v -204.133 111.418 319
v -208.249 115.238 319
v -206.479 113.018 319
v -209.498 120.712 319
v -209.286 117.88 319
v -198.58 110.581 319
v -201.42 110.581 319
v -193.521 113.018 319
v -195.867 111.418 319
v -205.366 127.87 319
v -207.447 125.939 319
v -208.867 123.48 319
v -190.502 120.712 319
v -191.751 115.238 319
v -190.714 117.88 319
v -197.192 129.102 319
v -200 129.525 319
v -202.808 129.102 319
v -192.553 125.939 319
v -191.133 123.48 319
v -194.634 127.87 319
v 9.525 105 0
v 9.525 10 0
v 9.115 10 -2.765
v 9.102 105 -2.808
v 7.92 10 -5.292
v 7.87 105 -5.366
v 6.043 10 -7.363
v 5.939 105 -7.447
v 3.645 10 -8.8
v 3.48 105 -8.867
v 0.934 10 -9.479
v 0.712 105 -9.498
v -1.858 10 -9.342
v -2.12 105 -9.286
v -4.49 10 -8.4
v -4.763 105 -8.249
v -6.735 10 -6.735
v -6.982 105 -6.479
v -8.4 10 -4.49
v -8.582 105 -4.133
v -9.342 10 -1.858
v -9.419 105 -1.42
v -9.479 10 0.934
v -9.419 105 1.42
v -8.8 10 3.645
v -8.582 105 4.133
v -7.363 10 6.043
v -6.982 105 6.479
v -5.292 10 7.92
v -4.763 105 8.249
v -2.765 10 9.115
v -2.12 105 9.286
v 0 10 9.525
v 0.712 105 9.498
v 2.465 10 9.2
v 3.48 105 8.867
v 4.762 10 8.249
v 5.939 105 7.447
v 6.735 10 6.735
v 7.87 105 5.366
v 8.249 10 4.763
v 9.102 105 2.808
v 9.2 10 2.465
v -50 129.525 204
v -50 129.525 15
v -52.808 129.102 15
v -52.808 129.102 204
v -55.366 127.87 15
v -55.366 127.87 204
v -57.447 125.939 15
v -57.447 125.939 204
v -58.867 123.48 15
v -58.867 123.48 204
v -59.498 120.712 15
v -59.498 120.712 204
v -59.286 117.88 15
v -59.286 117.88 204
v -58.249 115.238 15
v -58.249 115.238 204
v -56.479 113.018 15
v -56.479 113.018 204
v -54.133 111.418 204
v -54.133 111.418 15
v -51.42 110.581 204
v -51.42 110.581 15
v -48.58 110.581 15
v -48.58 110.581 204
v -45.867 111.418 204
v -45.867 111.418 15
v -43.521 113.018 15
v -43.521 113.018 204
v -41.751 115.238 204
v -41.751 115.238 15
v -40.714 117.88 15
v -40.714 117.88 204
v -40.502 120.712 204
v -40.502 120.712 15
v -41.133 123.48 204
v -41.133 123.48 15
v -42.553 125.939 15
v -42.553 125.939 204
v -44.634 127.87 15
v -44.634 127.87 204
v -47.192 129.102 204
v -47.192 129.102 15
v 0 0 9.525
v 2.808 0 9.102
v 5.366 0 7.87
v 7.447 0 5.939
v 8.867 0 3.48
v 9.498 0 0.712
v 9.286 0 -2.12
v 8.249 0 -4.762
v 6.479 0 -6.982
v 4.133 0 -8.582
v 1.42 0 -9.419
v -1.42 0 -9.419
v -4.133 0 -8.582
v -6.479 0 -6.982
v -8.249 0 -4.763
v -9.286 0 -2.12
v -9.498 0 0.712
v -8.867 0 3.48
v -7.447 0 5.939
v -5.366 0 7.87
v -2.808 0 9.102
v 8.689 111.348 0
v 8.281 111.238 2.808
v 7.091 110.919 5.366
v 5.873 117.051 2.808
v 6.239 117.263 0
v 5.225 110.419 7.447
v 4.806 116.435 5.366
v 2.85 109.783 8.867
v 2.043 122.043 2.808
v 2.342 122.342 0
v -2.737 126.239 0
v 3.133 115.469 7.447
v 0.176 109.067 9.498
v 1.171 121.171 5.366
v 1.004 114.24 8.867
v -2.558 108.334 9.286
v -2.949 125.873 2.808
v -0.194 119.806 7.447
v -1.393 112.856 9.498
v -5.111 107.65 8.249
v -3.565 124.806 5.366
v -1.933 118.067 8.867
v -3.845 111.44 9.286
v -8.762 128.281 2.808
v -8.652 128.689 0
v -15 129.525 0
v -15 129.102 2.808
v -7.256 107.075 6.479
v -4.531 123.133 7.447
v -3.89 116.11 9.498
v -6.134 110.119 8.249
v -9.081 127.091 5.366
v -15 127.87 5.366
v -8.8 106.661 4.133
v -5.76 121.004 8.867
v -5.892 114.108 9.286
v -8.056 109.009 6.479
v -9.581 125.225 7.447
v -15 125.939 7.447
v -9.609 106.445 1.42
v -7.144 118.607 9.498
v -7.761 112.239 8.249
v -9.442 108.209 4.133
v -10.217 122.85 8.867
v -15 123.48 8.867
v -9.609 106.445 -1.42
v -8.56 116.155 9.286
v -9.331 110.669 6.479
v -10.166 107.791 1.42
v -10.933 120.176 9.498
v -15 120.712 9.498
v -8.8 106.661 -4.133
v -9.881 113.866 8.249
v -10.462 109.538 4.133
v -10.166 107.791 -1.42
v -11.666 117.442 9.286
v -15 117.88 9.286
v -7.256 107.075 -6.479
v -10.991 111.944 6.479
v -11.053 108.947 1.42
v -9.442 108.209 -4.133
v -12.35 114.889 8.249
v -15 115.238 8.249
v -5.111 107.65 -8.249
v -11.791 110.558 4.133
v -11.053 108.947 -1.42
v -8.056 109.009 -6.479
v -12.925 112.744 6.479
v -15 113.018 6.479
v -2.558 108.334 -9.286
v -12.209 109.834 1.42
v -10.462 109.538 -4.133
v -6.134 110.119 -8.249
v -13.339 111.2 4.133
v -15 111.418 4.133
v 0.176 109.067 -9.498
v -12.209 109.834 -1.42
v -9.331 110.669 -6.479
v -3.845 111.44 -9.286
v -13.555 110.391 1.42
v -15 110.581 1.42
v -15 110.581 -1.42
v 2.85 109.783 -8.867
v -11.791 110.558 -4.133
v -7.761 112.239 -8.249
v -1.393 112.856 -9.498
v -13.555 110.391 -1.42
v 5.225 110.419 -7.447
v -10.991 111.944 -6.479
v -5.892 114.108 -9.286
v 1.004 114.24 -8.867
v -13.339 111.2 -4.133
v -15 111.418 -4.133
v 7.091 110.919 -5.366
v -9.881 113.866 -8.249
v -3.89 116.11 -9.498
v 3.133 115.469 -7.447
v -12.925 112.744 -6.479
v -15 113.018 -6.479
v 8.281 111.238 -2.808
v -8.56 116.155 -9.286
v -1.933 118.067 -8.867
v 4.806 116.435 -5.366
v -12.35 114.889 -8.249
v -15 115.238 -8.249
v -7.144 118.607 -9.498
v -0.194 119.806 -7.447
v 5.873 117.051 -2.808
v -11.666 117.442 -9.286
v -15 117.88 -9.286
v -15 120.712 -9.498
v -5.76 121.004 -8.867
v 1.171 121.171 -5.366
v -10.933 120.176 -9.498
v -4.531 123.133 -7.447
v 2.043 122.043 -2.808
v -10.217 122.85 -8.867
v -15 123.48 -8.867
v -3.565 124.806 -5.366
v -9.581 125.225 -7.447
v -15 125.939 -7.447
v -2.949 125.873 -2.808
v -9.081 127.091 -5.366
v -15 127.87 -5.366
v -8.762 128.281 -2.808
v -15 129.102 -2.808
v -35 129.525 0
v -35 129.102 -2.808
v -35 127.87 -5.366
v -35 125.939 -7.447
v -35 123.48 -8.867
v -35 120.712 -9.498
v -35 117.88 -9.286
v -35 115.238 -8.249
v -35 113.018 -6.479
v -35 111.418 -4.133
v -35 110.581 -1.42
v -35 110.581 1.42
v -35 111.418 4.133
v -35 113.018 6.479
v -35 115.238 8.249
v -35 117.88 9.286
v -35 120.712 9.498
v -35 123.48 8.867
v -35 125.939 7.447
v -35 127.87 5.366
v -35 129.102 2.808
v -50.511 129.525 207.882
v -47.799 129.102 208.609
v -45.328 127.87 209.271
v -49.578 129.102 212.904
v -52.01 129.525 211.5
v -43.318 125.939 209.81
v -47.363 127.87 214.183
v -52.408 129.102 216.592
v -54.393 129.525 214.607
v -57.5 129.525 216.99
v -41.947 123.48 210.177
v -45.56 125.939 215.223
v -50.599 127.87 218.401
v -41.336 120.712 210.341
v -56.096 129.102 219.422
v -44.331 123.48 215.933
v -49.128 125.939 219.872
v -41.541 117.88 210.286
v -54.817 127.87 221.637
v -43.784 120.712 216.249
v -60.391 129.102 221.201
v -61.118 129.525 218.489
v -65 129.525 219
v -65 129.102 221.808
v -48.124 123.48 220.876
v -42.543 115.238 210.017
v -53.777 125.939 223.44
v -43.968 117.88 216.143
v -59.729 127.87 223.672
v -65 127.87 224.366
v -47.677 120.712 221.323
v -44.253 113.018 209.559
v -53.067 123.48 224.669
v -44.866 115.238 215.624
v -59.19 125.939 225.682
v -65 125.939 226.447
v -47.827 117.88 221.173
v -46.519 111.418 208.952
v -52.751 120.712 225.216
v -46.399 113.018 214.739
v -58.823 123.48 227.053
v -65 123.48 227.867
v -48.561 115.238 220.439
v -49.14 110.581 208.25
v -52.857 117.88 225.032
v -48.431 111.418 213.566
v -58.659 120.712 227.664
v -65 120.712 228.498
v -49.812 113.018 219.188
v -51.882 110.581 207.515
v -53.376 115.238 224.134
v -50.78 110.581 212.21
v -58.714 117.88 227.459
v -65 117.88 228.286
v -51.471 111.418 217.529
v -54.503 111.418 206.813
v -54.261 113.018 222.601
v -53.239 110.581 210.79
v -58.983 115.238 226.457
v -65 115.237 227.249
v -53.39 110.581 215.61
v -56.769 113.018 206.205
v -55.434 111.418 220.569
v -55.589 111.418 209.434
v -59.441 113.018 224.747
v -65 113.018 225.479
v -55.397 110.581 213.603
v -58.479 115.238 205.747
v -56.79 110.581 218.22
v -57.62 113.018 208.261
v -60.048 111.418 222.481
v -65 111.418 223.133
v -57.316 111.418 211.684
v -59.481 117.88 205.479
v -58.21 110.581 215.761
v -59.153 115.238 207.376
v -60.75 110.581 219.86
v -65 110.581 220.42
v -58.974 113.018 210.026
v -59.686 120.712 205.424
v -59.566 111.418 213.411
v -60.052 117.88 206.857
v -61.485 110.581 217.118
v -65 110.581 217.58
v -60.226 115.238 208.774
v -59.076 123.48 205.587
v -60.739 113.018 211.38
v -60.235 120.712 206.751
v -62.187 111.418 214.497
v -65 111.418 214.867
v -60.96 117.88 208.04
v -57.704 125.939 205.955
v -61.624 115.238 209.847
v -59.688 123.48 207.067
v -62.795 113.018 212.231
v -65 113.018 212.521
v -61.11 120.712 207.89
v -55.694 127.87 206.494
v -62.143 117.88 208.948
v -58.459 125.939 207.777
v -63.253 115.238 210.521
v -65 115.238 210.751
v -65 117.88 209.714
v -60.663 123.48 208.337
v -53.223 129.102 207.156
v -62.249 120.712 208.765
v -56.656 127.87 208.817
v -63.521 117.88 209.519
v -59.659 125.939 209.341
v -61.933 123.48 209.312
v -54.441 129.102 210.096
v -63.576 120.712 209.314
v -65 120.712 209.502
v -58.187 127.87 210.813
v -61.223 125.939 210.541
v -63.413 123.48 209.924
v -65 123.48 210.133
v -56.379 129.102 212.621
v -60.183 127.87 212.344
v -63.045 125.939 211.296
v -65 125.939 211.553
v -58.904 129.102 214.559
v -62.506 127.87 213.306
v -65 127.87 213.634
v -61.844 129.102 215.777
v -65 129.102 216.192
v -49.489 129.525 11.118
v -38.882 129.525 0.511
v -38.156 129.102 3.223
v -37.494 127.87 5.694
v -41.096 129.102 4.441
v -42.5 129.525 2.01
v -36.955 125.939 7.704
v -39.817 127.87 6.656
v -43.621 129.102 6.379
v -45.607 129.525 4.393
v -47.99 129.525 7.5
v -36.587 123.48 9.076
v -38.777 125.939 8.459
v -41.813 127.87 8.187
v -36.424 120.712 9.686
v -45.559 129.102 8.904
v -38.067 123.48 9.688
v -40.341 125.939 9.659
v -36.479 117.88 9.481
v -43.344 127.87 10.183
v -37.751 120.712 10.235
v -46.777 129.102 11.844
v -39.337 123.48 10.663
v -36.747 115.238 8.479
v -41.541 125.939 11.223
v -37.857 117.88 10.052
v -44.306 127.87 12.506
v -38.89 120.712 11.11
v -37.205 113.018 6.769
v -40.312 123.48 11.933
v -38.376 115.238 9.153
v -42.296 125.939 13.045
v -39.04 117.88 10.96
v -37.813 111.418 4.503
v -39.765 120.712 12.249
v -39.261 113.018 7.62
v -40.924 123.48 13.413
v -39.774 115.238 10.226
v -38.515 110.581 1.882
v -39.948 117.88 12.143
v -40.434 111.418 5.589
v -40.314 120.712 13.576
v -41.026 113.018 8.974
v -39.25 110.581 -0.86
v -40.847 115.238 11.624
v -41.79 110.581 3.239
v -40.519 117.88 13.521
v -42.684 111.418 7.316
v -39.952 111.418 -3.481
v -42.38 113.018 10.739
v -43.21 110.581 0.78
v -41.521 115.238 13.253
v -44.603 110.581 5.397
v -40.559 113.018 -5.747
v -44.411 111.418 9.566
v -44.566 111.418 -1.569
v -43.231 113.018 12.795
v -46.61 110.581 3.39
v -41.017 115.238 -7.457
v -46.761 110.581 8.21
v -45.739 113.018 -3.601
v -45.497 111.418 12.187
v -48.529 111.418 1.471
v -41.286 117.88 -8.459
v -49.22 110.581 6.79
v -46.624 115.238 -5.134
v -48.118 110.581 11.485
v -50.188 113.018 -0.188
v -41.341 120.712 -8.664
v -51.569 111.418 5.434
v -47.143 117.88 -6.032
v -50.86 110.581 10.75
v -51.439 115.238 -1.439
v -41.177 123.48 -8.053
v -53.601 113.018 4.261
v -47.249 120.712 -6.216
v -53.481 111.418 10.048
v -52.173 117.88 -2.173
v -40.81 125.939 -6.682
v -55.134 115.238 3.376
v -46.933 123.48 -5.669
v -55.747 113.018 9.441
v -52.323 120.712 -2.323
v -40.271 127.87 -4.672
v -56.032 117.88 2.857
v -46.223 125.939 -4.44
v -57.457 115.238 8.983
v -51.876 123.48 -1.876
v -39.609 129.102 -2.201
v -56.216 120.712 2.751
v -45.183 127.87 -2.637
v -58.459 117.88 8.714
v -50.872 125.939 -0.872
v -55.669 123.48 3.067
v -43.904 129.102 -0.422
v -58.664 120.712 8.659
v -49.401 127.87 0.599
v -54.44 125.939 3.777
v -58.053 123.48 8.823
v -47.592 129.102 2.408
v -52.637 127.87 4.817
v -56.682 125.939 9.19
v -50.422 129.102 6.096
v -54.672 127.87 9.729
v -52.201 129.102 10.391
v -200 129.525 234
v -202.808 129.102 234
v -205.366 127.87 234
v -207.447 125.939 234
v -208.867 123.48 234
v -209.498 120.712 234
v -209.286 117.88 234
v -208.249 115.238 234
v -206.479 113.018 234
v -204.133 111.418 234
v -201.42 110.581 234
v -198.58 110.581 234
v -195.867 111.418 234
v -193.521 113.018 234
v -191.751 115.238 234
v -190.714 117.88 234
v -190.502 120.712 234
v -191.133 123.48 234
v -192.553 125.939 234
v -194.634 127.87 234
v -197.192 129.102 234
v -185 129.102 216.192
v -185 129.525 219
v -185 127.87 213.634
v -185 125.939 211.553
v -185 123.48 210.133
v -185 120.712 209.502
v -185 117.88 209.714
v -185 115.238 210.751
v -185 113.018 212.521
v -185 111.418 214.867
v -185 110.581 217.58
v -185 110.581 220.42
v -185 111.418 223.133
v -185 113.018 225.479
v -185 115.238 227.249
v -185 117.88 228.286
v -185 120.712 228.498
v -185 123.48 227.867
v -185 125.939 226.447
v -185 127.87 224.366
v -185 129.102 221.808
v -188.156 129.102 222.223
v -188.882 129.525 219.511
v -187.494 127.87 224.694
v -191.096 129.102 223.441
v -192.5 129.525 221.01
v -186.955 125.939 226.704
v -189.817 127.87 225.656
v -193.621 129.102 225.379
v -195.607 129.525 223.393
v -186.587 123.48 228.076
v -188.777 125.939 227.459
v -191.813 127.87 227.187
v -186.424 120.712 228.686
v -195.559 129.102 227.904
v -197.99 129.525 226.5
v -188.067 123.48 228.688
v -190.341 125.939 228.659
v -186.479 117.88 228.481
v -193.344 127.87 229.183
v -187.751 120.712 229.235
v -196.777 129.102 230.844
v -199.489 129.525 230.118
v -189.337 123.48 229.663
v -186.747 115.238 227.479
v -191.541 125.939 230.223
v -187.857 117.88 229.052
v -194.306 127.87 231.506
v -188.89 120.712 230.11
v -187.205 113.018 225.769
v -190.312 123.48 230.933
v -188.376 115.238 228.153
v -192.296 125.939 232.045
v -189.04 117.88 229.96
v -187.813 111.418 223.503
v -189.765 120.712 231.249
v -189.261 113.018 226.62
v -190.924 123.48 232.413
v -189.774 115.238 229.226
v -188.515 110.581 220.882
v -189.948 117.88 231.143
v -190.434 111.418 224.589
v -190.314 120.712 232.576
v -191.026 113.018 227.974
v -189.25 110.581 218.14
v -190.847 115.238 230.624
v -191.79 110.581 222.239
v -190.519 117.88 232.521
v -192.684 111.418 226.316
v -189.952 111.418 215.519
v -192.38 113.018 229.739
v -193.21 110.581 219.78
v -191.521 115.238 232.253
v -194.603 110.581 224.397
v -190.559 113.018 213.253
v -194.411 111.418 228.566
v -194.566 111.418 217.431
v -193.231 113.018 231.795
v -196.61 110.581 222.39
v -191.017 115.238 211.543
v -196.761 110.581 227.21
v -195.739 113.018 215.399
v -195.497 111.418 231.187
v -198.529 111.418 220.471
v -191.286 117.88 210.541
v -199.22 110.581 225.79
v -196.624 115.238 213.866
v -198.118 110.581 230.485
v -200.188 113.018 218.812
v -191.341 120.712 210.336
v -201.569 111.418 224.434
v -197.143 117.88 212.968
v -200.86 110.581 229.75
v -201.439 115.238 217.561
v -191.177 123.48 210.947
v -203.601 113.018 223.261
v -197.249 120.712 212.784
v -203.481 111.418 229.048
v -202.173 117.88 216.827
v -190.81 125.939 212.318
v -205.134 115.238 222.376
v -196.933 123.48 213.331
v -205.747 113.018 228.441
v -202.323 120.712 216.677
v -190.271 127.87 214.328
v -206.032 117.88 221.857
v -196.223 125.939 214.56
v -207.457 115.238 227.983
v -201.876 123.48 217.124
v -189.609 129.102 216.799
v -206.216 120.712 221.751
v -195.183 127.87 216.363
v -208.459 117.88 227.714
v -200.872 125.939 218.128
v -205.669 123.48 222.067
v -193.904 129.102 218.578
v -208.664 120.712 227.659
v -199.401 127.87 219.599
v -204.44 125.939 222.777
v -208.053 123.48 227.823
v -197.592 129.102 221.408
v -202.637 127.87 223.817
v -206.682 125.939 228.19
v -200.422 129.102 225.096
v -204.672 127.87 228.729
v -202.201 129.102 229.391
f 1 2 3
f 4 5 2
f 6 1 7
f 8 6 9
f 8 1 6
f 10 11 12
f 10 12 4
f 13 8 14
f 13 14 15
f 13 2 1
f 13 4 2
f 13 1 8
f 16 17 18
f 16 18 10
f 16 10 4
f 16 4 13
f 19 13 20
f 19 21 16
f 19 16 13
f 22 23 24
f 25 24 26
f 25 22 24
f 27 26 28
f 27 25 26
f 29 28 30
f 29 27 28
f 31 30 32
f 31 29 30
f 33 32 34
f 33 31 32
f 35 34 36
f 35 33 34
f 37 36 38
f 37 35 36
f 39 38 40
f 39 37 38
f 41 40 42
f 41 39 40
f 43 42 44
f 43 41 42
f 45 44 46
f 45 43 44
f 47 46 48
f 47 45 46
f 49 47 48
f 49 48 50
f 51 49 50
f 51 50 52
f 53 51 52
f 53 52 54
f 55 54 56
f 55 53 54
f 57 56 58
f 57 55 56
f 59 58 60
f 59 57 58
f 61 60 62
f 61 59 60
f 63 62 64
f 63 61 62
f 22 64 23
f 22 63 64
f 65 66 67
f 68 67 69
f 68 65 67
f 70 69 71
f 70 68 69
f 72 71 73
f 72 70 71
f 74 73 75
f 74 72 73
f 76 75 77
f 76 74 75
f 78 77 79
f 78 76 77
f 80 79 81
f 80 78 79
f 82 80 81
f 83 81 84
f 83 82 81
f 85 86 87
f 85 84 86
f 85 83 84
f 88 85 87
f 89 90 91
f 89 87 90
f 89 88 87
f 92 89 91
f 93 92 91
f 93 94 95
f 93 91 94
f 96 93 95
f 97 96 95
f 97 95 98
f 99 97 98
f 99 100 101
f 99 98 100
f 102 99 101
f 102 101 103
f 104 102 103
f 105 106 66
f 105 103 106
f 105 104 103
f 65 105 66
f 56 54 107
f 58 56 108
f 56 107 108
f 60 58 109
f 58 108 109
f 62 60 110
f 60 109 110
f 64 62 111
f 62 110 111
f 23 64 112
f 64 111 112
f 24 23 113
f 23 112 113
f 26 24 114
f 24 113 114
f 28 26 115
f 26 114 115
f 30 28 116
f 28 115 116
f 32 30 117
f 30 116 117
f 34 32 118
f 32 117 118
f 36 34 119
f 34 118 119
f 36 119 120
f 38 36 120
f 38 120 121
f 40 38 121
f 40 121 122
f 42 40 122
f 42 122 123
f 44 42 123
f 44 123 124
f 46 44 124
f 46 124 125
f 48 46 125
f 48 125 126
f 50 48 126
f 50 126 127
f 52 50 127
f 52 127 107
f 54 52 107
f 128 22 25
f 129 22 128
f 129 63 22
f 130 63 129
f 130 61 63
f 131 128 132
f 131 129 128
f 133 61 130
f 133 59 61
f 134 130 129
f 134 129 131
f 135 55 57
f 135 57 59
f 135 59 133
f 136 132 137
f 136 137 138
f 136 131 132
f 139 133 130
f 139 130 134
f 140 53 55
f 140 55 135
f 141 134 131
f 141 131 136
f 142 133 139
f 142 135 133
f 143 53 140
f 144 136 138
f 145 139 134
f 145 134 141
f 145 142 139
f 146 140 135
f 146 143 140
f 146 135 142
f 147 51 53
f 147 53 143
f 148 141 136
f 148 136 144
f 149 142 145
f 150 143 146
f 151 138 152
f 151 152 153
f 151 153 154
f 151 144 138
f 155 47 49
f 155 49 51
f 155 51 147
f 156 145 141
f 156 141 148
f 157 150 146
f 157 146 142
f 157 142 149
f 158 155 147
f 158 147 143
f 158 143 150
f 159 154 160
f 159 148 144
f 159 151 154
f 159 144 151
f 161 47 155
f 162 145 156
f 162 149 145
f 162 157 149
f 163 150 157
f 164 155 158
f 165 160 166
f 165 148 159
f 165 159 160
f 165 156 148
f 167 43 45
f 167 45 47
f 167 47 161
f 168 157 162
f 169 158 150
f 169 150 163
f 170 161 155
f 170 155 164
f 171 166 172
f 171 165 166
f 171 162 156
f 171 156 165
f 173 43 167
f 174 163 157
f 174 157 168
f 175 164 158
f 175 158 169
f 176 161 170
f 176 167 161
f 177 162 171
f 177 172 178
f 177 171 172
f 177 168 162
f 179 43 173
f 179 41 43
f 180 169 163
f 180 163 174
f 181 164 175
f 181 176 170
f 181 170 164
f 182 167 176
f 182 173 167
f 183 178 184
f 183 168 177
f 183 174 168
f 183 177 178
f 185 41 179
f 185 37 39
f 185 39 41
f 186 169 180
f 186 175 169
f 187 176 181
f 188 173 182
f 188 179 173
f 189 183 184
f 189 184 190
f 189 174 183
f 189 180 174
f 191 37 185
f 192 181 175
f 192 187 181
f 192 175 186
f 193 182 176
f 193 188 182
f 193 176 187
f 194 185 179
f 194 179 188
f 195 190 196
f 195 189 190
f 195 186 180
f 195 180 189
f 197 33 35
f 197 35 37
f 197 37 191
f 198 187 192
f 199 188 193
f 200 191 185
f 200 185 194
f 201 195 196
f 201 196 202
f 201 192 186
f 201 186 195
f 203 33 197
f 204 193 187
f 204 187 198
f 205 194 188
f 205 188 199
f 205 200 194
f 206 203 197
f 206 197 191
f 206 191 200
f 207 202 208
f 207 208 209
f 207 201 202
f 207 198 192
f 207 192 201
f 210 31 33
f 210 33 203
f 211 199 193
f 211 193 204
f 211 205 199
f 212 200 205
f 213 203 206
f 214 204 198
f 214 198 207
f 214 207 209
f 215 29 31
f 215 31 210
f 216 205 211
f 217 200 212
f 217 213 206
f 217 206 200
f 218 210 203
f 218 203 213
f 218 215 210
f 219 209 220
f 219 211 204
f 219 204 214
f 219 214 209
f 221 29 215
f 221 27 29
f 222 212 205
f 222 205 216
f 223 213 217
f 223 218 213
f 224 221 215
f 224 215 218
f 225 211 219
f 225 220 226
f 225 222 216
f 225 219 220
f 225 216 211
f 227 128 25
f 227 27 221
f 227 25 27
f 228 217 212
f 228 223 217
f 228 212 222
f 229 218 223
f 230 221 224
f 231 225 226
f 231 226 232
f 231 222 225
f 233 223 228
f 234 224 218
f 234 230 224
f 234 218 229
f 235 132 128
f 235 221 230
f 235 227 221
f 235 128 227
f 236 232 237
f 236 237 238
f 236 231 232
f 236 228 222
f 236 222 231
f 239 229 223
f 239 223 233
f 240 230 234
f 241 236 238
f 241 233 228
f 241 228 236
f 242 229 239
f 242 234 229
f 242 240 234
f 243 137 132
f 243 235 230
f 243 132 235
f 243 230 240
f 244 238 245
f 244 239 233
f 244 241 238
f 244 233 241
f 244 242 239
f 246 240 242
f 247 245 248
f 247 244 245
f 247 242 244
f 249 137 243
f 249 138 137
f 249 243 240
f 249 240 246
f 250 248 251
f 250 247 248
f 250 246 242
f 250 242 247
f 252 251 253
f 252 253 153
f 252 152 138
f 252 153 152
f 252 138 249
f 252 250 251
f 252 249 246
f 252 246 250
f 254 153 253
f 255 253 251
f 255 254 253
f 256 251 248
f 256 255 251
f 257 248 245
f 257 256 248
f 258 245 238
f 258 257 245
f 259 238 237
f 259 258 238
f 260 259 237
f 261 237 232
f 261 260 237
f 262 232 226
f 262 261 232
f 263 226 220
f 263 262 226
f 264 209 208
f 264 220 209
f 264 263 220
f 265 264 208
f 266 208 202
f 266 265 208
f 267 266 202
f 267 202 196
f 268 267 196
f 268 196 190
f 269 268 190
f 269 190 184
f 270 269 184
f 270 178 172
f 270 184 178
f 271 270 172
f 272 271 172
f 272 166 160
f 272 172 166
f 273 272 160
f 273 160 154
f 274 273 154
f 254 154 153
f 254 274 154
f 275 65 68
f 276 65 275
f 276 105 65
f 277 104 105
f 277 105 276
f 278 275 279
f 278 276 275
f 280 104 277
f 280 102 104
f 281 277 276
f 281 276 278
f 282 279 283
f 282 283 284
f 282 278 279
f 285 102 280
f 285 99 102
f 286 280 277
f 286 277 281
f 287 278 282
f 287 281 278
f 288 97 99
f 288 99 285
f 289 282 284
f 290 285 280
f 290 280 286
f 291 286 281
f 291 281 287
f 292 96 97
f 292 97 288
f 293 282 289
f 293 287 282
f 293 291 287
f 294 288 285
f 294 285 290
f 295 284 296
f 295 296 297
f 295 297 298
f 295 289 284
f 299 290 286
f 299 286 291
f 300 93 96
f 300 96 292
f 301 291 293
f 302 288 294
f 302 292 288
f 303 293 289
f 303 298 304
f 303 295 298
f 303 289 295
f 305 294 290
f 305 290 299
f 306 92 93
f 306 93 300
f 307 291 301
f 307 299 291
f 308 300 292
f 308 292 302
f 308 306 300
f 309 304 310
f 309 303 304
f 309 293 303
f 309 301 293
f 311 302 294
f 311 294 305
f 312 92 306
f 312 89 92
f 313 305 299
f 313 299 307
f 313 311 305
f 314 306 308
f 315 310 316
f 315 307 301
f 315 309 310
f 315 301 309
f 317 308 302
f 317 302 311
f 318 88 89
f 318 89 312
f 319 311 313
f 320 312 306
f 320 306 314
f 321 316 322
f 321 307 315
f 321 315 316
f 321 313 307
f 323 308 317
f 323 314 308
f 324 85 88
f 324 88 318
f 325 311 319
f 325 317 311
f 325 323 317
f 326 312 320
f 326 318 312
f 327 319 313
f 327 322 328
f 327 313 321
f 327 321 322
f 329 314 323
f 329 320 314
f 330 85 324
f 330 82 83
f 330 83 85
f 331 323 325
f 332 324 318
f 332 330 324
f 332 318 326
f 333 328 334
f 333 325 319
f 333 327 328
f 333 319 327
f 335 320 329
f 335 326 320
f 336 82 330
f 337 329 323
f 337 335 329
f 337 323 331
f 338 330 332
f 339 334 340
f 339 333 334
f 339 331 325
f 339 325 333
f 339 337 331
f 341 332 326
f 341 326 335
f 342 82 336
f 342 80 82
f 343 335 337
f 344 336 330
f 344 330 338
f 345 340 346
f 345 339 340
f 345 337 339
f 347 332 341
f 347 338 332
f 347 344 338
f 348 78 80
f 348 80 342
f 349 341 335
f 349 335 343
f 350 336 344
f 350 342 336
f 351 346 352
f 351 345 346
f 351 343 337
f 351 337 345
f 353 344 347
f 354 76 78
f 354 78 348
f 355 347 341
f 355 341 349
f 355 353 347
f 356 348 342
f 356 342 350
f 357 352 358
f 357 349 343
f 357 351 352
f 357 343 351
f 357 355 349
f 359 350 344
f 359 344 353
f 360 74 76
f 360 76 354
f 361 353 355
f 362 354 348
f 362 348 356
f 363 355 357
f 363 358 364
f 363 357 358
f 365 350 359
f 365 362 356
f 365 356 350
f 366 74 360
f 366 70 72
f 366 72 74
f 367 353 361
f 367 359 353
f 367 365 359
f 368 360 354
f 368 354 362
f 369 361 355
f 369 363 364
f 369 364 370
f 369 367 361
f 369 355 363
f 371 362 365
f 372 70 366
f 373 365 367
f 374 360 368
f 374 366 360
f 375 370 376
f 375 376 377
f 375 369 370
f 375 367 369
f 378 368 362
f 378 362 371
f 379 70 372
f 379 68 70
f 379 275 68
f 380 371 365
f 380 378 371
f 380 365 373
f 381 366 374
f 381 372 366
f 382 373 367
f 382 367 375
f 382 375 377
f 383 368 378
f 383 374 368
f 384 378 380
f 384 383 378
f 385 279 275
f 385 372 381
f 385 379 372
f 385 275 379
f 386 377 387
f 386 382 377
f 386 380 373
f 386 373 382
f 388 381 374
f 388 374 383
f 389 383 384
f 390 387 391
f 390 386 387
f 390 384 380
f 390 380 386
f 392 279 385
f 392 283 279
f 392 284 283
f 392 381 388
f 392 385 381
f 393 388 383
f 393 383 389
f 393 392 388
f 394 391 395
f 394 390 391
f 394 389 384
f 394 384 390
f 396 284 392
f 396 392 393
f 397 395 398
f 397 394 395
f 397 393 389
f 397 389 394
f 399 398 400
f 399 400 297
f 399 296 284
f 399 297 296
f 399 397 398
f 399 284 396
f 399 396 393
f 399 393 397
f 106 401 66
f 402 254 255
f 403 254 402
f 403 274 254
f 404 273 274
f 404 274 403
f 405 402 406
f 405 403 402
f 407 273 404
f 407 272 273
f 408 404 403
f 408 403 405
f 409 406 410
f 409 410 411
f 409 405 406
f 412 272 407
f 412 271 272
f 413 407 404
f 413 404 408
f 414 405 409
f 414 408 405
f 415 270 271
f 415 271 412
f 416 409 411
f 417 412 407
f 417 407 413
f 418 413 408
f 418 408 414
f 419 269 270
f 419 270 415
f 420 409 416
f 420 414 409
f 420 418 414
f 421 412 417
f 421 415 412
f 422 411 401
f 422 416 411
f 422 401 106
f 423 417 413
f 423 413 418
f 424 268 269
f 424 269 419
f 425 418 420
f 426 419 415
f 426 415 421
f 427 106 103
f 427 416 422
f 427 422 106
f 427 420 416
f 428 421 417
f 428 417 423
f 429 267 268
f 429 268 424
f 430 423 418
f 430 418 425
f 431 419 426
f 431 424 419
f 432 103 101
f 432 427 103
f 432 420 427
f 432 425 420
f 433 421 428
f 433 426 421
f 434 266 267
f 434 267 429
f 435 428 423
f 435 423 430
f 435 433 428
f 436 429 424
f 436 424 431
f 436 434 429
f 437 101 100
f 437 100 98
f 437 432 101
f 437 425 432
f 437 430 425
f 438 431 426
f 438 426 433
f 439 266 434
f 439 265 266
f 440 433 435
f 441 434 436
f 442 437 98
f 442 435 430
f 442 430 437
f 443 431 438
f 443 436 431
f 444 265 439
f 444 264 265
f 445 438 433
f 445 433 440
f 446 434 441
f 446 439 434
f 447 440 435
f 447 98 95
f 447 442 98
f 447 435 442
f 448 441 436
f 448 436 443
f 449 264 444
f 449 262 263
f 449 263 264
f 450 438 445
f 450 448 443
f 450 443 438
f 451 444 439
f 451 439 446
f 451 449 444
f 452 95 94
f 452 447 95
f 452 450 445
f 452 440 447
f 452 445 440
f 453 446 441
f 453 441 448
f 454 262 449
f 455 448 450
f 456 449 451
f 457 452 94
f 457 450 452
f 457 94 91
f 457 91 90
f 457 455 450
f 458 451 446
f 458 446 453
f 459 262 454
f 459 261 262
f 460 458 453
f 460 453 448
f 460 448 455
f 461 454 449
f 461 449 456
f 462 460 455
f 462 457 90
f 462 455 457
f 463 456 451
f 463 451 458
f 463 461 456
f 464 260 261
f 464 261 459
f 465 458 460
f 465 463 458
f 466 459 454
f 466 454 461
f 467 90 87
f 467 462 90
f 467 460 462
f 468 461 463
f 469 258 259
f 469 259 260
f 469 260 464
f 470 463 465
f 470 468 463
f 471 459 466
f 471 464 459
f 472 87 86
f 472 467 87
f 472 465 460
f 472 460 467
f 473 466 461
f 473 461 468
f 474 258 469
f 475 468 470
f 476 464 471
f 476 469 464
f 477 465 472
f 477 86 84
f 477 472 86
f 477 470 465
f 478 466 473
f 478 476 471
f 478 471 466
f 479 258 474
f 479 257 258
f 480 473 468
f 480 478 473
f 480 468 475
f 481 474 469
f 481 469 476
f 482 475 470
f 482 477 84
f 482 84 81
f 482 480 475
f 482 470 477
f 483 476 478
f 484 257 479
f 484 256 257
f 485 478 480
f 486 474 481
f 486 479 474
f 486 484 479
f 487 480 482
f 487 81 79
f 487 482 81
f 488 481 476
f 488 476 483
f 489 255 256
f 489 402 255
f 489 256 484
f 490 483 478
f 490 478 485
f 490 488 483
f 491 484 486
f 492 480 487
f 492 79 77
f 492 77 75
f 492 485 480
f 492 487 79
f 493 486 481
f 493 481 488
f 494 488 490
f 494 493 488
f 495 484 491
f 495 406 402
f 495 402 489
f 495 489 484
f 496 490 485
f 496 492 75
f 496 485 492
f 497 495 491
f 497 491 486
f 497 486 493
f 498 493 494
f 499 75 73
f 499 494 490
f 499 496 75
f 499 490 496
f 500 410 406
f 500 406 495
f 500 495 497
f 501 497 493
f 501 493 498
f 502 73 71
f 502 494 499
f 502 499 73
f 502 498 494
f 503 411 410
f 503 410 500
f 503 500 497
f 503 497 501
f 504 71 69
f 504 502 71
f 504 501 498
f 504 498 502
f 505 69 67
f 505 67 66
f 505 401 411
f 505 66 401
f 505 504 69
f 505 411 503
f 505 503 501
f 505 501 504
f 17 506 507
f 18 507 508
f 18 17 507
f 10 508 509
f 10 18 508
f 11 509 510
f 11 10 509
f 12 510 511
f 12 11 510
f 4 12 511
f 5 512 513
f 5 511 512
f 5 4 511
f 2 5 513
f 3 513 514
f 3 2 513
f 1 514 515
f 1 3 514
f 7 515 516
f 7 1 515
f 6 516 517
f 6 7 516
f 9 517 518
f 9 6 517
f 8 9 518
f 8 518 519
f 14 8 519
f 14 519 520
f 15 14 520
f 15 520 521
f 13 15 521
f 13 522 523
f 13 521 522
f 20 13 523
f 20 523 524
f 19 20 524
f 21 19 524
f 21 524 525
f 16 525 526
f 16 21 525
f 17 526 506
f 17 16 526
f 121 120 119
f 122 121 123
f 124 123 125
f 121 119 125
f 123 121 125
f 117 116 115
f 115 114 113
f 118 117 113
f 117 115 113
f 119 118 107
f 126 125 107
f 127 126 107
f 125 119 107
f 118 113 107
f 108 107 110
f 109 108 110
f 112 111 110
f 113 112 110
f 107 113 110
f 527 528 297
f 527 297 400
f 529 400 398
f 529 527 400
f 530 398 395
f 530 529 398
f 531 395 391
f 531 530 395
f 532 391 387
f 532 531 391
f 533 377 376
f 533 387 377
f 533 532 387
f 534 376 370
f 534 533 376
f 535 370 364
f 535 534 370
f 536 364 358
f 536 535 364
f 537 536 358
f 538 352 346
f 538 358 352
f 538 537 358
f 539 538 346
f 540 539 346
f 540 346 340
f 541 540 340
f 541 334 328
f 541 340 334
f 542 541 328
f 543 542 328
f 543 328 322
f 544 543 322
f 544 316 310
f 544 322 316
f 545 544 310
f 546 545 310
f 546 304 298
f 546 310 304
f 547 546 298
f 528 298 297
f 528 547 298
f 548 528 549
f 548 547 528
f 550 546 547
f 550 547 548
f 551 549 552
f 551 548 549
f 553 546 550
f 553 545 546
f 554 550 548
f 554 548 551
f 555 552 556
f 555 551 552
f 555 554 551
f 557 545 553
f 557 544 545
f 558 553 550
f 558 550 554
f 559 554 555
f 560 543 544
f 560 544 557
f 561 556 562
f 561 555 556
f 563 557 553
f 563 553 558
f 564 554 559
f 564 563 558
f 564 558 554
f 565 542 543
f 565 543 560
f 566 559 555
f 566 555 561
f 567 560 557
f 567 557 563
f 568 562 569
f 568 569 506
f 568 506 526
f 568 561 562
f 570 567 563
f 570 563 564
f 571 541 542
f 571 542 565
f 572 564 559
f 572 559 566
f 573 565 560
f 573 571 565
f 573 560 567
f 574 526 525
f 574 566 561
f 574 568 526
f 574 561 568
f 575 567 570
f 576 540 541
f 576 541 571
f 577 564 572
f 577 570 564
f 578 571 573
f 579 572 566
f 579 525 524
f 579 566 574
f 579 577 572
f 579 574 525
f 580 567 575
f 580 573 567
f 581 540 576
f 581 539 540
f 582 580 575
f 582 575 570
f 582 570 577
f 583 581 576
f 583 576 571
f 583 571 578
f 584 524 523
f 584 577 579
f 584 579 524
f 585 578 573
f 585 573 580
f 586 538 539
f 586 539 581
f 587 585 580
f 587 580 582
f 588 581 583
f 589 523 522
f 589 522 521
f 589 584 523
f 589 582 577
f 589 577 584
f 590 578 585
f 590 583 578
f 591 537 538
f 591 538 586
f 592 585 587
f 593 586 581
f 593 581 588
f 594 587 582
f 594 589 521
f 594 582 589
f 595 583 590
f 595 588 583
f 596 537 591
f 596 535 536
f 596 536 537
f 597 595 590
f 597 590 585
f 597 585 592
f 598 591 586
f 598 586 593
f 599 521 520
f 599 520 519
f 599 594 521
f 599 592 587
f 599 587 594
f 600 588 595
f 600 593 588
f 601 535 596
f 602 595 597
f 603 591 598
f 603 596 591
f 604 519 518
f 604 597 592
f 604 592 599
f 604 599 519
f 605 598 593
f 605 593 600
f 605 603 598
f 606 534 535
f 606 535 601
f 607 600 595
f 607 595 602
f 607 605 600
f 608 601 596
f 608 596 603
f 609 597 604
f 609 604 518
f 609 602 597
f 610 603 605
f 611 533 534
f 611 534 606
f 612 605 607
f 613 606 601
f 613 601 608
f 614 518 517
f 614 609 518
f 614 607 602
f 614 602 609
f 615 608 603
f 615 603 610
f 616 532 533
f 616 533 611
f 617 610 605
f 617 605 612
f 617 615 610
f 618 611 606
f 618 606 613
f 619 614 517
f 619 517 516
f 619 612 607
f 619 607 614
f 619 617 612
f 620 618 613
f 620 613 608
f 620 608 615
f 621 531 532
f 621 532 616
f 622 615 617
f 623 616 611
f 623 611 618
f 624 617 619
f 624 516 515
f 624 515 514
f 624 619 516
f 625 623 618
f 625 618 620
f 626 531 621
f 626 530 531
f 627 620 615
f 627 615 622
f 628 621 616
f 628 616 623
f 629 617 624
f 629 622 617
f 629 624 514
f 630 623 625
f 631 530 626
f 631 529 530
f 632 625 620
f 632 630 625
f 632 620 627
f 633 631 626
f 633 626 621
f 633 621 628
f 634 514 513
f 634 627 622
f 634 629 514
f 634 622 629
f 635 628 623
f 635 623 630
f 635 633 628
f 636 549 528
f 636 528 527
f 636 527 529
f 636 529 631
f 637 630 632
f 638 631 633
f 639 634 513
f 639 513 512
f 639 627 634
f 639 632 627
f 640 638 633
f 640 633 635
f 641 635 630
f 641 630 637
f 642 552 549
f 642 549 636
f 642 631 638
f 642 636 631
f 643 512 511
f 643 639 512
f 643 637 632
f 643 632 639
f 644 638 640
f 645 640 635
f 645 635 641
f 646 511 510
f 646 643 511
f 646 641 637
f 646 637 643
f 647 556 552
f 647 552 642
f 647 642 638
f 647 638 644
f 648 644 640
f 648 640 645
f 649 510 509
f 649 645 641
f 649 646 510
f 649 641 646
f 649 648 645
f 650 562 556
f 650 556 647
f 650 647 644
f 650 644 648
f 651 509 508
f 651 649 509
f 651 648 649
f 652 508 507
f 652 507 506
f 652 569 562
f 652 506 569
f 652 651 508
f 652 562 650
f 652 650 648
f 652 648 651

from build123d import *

# Parameters (mm, degrees)
CROQUIS1_R              = 9.525
SALIENTE_EXTRUIR1_DEPTH = 10
CROQUIS2_R              = 9.525


with BuildPart() as part:
    # Croquis1 → Saliente-Extruir1 (new body)
    with BuildSketch(Plane(origin=(0, 0, 0), x_dir=(1, 0, 0), z_dir=(0, 1, 0))):
        with Locations(Location((0, 0, 0), (0, 0, 270))):
            Circle(CROQUIS1_R)
    extrude(amount=SALIENTE_EXTRUIR1_DEPTH)

    # Barrer1: sweep along a curve in space
    with BuildLine() as barrer1_path:
        Line((0, 10, 0), (0, 105, 0))
        ThreePointArc((0, 105, 0), (-4.393398282, 115.606601718, 0), (-15, 120, 0))
        Line((-15, 120, 0), (-35, 120, 0))
        ThreePointArc((-35, 120, 0), (-45.606601718, 120, 4.393398282), (-50, 120, 15))
        Line((-50, 120, 15), (-50, 120, 204))
        ThreePointArc((-50, 120, 204), (-54.393398282, 120, 214.606601718), (-65, 120, 219))
        Line((-65, 120, 219), (-185, 120, 219))
        ThreePointArc((-185, 120, 219), (-195.606601718, 120, 223.393398282), (-200, 120, 234))
        Line((-200, 120, 234), (-200, 120, 319))
    # Croquis2 → Barrer1 (sweep)
    with BuildSketch(Plane(origin=(0, 10, 0), x_dir=(1, 0, 0), z_dir=(0, 1, 0))):
        Circle(CROQUIS2_R)
    sweep(path=barrer1_path.line)


solid = part.part
